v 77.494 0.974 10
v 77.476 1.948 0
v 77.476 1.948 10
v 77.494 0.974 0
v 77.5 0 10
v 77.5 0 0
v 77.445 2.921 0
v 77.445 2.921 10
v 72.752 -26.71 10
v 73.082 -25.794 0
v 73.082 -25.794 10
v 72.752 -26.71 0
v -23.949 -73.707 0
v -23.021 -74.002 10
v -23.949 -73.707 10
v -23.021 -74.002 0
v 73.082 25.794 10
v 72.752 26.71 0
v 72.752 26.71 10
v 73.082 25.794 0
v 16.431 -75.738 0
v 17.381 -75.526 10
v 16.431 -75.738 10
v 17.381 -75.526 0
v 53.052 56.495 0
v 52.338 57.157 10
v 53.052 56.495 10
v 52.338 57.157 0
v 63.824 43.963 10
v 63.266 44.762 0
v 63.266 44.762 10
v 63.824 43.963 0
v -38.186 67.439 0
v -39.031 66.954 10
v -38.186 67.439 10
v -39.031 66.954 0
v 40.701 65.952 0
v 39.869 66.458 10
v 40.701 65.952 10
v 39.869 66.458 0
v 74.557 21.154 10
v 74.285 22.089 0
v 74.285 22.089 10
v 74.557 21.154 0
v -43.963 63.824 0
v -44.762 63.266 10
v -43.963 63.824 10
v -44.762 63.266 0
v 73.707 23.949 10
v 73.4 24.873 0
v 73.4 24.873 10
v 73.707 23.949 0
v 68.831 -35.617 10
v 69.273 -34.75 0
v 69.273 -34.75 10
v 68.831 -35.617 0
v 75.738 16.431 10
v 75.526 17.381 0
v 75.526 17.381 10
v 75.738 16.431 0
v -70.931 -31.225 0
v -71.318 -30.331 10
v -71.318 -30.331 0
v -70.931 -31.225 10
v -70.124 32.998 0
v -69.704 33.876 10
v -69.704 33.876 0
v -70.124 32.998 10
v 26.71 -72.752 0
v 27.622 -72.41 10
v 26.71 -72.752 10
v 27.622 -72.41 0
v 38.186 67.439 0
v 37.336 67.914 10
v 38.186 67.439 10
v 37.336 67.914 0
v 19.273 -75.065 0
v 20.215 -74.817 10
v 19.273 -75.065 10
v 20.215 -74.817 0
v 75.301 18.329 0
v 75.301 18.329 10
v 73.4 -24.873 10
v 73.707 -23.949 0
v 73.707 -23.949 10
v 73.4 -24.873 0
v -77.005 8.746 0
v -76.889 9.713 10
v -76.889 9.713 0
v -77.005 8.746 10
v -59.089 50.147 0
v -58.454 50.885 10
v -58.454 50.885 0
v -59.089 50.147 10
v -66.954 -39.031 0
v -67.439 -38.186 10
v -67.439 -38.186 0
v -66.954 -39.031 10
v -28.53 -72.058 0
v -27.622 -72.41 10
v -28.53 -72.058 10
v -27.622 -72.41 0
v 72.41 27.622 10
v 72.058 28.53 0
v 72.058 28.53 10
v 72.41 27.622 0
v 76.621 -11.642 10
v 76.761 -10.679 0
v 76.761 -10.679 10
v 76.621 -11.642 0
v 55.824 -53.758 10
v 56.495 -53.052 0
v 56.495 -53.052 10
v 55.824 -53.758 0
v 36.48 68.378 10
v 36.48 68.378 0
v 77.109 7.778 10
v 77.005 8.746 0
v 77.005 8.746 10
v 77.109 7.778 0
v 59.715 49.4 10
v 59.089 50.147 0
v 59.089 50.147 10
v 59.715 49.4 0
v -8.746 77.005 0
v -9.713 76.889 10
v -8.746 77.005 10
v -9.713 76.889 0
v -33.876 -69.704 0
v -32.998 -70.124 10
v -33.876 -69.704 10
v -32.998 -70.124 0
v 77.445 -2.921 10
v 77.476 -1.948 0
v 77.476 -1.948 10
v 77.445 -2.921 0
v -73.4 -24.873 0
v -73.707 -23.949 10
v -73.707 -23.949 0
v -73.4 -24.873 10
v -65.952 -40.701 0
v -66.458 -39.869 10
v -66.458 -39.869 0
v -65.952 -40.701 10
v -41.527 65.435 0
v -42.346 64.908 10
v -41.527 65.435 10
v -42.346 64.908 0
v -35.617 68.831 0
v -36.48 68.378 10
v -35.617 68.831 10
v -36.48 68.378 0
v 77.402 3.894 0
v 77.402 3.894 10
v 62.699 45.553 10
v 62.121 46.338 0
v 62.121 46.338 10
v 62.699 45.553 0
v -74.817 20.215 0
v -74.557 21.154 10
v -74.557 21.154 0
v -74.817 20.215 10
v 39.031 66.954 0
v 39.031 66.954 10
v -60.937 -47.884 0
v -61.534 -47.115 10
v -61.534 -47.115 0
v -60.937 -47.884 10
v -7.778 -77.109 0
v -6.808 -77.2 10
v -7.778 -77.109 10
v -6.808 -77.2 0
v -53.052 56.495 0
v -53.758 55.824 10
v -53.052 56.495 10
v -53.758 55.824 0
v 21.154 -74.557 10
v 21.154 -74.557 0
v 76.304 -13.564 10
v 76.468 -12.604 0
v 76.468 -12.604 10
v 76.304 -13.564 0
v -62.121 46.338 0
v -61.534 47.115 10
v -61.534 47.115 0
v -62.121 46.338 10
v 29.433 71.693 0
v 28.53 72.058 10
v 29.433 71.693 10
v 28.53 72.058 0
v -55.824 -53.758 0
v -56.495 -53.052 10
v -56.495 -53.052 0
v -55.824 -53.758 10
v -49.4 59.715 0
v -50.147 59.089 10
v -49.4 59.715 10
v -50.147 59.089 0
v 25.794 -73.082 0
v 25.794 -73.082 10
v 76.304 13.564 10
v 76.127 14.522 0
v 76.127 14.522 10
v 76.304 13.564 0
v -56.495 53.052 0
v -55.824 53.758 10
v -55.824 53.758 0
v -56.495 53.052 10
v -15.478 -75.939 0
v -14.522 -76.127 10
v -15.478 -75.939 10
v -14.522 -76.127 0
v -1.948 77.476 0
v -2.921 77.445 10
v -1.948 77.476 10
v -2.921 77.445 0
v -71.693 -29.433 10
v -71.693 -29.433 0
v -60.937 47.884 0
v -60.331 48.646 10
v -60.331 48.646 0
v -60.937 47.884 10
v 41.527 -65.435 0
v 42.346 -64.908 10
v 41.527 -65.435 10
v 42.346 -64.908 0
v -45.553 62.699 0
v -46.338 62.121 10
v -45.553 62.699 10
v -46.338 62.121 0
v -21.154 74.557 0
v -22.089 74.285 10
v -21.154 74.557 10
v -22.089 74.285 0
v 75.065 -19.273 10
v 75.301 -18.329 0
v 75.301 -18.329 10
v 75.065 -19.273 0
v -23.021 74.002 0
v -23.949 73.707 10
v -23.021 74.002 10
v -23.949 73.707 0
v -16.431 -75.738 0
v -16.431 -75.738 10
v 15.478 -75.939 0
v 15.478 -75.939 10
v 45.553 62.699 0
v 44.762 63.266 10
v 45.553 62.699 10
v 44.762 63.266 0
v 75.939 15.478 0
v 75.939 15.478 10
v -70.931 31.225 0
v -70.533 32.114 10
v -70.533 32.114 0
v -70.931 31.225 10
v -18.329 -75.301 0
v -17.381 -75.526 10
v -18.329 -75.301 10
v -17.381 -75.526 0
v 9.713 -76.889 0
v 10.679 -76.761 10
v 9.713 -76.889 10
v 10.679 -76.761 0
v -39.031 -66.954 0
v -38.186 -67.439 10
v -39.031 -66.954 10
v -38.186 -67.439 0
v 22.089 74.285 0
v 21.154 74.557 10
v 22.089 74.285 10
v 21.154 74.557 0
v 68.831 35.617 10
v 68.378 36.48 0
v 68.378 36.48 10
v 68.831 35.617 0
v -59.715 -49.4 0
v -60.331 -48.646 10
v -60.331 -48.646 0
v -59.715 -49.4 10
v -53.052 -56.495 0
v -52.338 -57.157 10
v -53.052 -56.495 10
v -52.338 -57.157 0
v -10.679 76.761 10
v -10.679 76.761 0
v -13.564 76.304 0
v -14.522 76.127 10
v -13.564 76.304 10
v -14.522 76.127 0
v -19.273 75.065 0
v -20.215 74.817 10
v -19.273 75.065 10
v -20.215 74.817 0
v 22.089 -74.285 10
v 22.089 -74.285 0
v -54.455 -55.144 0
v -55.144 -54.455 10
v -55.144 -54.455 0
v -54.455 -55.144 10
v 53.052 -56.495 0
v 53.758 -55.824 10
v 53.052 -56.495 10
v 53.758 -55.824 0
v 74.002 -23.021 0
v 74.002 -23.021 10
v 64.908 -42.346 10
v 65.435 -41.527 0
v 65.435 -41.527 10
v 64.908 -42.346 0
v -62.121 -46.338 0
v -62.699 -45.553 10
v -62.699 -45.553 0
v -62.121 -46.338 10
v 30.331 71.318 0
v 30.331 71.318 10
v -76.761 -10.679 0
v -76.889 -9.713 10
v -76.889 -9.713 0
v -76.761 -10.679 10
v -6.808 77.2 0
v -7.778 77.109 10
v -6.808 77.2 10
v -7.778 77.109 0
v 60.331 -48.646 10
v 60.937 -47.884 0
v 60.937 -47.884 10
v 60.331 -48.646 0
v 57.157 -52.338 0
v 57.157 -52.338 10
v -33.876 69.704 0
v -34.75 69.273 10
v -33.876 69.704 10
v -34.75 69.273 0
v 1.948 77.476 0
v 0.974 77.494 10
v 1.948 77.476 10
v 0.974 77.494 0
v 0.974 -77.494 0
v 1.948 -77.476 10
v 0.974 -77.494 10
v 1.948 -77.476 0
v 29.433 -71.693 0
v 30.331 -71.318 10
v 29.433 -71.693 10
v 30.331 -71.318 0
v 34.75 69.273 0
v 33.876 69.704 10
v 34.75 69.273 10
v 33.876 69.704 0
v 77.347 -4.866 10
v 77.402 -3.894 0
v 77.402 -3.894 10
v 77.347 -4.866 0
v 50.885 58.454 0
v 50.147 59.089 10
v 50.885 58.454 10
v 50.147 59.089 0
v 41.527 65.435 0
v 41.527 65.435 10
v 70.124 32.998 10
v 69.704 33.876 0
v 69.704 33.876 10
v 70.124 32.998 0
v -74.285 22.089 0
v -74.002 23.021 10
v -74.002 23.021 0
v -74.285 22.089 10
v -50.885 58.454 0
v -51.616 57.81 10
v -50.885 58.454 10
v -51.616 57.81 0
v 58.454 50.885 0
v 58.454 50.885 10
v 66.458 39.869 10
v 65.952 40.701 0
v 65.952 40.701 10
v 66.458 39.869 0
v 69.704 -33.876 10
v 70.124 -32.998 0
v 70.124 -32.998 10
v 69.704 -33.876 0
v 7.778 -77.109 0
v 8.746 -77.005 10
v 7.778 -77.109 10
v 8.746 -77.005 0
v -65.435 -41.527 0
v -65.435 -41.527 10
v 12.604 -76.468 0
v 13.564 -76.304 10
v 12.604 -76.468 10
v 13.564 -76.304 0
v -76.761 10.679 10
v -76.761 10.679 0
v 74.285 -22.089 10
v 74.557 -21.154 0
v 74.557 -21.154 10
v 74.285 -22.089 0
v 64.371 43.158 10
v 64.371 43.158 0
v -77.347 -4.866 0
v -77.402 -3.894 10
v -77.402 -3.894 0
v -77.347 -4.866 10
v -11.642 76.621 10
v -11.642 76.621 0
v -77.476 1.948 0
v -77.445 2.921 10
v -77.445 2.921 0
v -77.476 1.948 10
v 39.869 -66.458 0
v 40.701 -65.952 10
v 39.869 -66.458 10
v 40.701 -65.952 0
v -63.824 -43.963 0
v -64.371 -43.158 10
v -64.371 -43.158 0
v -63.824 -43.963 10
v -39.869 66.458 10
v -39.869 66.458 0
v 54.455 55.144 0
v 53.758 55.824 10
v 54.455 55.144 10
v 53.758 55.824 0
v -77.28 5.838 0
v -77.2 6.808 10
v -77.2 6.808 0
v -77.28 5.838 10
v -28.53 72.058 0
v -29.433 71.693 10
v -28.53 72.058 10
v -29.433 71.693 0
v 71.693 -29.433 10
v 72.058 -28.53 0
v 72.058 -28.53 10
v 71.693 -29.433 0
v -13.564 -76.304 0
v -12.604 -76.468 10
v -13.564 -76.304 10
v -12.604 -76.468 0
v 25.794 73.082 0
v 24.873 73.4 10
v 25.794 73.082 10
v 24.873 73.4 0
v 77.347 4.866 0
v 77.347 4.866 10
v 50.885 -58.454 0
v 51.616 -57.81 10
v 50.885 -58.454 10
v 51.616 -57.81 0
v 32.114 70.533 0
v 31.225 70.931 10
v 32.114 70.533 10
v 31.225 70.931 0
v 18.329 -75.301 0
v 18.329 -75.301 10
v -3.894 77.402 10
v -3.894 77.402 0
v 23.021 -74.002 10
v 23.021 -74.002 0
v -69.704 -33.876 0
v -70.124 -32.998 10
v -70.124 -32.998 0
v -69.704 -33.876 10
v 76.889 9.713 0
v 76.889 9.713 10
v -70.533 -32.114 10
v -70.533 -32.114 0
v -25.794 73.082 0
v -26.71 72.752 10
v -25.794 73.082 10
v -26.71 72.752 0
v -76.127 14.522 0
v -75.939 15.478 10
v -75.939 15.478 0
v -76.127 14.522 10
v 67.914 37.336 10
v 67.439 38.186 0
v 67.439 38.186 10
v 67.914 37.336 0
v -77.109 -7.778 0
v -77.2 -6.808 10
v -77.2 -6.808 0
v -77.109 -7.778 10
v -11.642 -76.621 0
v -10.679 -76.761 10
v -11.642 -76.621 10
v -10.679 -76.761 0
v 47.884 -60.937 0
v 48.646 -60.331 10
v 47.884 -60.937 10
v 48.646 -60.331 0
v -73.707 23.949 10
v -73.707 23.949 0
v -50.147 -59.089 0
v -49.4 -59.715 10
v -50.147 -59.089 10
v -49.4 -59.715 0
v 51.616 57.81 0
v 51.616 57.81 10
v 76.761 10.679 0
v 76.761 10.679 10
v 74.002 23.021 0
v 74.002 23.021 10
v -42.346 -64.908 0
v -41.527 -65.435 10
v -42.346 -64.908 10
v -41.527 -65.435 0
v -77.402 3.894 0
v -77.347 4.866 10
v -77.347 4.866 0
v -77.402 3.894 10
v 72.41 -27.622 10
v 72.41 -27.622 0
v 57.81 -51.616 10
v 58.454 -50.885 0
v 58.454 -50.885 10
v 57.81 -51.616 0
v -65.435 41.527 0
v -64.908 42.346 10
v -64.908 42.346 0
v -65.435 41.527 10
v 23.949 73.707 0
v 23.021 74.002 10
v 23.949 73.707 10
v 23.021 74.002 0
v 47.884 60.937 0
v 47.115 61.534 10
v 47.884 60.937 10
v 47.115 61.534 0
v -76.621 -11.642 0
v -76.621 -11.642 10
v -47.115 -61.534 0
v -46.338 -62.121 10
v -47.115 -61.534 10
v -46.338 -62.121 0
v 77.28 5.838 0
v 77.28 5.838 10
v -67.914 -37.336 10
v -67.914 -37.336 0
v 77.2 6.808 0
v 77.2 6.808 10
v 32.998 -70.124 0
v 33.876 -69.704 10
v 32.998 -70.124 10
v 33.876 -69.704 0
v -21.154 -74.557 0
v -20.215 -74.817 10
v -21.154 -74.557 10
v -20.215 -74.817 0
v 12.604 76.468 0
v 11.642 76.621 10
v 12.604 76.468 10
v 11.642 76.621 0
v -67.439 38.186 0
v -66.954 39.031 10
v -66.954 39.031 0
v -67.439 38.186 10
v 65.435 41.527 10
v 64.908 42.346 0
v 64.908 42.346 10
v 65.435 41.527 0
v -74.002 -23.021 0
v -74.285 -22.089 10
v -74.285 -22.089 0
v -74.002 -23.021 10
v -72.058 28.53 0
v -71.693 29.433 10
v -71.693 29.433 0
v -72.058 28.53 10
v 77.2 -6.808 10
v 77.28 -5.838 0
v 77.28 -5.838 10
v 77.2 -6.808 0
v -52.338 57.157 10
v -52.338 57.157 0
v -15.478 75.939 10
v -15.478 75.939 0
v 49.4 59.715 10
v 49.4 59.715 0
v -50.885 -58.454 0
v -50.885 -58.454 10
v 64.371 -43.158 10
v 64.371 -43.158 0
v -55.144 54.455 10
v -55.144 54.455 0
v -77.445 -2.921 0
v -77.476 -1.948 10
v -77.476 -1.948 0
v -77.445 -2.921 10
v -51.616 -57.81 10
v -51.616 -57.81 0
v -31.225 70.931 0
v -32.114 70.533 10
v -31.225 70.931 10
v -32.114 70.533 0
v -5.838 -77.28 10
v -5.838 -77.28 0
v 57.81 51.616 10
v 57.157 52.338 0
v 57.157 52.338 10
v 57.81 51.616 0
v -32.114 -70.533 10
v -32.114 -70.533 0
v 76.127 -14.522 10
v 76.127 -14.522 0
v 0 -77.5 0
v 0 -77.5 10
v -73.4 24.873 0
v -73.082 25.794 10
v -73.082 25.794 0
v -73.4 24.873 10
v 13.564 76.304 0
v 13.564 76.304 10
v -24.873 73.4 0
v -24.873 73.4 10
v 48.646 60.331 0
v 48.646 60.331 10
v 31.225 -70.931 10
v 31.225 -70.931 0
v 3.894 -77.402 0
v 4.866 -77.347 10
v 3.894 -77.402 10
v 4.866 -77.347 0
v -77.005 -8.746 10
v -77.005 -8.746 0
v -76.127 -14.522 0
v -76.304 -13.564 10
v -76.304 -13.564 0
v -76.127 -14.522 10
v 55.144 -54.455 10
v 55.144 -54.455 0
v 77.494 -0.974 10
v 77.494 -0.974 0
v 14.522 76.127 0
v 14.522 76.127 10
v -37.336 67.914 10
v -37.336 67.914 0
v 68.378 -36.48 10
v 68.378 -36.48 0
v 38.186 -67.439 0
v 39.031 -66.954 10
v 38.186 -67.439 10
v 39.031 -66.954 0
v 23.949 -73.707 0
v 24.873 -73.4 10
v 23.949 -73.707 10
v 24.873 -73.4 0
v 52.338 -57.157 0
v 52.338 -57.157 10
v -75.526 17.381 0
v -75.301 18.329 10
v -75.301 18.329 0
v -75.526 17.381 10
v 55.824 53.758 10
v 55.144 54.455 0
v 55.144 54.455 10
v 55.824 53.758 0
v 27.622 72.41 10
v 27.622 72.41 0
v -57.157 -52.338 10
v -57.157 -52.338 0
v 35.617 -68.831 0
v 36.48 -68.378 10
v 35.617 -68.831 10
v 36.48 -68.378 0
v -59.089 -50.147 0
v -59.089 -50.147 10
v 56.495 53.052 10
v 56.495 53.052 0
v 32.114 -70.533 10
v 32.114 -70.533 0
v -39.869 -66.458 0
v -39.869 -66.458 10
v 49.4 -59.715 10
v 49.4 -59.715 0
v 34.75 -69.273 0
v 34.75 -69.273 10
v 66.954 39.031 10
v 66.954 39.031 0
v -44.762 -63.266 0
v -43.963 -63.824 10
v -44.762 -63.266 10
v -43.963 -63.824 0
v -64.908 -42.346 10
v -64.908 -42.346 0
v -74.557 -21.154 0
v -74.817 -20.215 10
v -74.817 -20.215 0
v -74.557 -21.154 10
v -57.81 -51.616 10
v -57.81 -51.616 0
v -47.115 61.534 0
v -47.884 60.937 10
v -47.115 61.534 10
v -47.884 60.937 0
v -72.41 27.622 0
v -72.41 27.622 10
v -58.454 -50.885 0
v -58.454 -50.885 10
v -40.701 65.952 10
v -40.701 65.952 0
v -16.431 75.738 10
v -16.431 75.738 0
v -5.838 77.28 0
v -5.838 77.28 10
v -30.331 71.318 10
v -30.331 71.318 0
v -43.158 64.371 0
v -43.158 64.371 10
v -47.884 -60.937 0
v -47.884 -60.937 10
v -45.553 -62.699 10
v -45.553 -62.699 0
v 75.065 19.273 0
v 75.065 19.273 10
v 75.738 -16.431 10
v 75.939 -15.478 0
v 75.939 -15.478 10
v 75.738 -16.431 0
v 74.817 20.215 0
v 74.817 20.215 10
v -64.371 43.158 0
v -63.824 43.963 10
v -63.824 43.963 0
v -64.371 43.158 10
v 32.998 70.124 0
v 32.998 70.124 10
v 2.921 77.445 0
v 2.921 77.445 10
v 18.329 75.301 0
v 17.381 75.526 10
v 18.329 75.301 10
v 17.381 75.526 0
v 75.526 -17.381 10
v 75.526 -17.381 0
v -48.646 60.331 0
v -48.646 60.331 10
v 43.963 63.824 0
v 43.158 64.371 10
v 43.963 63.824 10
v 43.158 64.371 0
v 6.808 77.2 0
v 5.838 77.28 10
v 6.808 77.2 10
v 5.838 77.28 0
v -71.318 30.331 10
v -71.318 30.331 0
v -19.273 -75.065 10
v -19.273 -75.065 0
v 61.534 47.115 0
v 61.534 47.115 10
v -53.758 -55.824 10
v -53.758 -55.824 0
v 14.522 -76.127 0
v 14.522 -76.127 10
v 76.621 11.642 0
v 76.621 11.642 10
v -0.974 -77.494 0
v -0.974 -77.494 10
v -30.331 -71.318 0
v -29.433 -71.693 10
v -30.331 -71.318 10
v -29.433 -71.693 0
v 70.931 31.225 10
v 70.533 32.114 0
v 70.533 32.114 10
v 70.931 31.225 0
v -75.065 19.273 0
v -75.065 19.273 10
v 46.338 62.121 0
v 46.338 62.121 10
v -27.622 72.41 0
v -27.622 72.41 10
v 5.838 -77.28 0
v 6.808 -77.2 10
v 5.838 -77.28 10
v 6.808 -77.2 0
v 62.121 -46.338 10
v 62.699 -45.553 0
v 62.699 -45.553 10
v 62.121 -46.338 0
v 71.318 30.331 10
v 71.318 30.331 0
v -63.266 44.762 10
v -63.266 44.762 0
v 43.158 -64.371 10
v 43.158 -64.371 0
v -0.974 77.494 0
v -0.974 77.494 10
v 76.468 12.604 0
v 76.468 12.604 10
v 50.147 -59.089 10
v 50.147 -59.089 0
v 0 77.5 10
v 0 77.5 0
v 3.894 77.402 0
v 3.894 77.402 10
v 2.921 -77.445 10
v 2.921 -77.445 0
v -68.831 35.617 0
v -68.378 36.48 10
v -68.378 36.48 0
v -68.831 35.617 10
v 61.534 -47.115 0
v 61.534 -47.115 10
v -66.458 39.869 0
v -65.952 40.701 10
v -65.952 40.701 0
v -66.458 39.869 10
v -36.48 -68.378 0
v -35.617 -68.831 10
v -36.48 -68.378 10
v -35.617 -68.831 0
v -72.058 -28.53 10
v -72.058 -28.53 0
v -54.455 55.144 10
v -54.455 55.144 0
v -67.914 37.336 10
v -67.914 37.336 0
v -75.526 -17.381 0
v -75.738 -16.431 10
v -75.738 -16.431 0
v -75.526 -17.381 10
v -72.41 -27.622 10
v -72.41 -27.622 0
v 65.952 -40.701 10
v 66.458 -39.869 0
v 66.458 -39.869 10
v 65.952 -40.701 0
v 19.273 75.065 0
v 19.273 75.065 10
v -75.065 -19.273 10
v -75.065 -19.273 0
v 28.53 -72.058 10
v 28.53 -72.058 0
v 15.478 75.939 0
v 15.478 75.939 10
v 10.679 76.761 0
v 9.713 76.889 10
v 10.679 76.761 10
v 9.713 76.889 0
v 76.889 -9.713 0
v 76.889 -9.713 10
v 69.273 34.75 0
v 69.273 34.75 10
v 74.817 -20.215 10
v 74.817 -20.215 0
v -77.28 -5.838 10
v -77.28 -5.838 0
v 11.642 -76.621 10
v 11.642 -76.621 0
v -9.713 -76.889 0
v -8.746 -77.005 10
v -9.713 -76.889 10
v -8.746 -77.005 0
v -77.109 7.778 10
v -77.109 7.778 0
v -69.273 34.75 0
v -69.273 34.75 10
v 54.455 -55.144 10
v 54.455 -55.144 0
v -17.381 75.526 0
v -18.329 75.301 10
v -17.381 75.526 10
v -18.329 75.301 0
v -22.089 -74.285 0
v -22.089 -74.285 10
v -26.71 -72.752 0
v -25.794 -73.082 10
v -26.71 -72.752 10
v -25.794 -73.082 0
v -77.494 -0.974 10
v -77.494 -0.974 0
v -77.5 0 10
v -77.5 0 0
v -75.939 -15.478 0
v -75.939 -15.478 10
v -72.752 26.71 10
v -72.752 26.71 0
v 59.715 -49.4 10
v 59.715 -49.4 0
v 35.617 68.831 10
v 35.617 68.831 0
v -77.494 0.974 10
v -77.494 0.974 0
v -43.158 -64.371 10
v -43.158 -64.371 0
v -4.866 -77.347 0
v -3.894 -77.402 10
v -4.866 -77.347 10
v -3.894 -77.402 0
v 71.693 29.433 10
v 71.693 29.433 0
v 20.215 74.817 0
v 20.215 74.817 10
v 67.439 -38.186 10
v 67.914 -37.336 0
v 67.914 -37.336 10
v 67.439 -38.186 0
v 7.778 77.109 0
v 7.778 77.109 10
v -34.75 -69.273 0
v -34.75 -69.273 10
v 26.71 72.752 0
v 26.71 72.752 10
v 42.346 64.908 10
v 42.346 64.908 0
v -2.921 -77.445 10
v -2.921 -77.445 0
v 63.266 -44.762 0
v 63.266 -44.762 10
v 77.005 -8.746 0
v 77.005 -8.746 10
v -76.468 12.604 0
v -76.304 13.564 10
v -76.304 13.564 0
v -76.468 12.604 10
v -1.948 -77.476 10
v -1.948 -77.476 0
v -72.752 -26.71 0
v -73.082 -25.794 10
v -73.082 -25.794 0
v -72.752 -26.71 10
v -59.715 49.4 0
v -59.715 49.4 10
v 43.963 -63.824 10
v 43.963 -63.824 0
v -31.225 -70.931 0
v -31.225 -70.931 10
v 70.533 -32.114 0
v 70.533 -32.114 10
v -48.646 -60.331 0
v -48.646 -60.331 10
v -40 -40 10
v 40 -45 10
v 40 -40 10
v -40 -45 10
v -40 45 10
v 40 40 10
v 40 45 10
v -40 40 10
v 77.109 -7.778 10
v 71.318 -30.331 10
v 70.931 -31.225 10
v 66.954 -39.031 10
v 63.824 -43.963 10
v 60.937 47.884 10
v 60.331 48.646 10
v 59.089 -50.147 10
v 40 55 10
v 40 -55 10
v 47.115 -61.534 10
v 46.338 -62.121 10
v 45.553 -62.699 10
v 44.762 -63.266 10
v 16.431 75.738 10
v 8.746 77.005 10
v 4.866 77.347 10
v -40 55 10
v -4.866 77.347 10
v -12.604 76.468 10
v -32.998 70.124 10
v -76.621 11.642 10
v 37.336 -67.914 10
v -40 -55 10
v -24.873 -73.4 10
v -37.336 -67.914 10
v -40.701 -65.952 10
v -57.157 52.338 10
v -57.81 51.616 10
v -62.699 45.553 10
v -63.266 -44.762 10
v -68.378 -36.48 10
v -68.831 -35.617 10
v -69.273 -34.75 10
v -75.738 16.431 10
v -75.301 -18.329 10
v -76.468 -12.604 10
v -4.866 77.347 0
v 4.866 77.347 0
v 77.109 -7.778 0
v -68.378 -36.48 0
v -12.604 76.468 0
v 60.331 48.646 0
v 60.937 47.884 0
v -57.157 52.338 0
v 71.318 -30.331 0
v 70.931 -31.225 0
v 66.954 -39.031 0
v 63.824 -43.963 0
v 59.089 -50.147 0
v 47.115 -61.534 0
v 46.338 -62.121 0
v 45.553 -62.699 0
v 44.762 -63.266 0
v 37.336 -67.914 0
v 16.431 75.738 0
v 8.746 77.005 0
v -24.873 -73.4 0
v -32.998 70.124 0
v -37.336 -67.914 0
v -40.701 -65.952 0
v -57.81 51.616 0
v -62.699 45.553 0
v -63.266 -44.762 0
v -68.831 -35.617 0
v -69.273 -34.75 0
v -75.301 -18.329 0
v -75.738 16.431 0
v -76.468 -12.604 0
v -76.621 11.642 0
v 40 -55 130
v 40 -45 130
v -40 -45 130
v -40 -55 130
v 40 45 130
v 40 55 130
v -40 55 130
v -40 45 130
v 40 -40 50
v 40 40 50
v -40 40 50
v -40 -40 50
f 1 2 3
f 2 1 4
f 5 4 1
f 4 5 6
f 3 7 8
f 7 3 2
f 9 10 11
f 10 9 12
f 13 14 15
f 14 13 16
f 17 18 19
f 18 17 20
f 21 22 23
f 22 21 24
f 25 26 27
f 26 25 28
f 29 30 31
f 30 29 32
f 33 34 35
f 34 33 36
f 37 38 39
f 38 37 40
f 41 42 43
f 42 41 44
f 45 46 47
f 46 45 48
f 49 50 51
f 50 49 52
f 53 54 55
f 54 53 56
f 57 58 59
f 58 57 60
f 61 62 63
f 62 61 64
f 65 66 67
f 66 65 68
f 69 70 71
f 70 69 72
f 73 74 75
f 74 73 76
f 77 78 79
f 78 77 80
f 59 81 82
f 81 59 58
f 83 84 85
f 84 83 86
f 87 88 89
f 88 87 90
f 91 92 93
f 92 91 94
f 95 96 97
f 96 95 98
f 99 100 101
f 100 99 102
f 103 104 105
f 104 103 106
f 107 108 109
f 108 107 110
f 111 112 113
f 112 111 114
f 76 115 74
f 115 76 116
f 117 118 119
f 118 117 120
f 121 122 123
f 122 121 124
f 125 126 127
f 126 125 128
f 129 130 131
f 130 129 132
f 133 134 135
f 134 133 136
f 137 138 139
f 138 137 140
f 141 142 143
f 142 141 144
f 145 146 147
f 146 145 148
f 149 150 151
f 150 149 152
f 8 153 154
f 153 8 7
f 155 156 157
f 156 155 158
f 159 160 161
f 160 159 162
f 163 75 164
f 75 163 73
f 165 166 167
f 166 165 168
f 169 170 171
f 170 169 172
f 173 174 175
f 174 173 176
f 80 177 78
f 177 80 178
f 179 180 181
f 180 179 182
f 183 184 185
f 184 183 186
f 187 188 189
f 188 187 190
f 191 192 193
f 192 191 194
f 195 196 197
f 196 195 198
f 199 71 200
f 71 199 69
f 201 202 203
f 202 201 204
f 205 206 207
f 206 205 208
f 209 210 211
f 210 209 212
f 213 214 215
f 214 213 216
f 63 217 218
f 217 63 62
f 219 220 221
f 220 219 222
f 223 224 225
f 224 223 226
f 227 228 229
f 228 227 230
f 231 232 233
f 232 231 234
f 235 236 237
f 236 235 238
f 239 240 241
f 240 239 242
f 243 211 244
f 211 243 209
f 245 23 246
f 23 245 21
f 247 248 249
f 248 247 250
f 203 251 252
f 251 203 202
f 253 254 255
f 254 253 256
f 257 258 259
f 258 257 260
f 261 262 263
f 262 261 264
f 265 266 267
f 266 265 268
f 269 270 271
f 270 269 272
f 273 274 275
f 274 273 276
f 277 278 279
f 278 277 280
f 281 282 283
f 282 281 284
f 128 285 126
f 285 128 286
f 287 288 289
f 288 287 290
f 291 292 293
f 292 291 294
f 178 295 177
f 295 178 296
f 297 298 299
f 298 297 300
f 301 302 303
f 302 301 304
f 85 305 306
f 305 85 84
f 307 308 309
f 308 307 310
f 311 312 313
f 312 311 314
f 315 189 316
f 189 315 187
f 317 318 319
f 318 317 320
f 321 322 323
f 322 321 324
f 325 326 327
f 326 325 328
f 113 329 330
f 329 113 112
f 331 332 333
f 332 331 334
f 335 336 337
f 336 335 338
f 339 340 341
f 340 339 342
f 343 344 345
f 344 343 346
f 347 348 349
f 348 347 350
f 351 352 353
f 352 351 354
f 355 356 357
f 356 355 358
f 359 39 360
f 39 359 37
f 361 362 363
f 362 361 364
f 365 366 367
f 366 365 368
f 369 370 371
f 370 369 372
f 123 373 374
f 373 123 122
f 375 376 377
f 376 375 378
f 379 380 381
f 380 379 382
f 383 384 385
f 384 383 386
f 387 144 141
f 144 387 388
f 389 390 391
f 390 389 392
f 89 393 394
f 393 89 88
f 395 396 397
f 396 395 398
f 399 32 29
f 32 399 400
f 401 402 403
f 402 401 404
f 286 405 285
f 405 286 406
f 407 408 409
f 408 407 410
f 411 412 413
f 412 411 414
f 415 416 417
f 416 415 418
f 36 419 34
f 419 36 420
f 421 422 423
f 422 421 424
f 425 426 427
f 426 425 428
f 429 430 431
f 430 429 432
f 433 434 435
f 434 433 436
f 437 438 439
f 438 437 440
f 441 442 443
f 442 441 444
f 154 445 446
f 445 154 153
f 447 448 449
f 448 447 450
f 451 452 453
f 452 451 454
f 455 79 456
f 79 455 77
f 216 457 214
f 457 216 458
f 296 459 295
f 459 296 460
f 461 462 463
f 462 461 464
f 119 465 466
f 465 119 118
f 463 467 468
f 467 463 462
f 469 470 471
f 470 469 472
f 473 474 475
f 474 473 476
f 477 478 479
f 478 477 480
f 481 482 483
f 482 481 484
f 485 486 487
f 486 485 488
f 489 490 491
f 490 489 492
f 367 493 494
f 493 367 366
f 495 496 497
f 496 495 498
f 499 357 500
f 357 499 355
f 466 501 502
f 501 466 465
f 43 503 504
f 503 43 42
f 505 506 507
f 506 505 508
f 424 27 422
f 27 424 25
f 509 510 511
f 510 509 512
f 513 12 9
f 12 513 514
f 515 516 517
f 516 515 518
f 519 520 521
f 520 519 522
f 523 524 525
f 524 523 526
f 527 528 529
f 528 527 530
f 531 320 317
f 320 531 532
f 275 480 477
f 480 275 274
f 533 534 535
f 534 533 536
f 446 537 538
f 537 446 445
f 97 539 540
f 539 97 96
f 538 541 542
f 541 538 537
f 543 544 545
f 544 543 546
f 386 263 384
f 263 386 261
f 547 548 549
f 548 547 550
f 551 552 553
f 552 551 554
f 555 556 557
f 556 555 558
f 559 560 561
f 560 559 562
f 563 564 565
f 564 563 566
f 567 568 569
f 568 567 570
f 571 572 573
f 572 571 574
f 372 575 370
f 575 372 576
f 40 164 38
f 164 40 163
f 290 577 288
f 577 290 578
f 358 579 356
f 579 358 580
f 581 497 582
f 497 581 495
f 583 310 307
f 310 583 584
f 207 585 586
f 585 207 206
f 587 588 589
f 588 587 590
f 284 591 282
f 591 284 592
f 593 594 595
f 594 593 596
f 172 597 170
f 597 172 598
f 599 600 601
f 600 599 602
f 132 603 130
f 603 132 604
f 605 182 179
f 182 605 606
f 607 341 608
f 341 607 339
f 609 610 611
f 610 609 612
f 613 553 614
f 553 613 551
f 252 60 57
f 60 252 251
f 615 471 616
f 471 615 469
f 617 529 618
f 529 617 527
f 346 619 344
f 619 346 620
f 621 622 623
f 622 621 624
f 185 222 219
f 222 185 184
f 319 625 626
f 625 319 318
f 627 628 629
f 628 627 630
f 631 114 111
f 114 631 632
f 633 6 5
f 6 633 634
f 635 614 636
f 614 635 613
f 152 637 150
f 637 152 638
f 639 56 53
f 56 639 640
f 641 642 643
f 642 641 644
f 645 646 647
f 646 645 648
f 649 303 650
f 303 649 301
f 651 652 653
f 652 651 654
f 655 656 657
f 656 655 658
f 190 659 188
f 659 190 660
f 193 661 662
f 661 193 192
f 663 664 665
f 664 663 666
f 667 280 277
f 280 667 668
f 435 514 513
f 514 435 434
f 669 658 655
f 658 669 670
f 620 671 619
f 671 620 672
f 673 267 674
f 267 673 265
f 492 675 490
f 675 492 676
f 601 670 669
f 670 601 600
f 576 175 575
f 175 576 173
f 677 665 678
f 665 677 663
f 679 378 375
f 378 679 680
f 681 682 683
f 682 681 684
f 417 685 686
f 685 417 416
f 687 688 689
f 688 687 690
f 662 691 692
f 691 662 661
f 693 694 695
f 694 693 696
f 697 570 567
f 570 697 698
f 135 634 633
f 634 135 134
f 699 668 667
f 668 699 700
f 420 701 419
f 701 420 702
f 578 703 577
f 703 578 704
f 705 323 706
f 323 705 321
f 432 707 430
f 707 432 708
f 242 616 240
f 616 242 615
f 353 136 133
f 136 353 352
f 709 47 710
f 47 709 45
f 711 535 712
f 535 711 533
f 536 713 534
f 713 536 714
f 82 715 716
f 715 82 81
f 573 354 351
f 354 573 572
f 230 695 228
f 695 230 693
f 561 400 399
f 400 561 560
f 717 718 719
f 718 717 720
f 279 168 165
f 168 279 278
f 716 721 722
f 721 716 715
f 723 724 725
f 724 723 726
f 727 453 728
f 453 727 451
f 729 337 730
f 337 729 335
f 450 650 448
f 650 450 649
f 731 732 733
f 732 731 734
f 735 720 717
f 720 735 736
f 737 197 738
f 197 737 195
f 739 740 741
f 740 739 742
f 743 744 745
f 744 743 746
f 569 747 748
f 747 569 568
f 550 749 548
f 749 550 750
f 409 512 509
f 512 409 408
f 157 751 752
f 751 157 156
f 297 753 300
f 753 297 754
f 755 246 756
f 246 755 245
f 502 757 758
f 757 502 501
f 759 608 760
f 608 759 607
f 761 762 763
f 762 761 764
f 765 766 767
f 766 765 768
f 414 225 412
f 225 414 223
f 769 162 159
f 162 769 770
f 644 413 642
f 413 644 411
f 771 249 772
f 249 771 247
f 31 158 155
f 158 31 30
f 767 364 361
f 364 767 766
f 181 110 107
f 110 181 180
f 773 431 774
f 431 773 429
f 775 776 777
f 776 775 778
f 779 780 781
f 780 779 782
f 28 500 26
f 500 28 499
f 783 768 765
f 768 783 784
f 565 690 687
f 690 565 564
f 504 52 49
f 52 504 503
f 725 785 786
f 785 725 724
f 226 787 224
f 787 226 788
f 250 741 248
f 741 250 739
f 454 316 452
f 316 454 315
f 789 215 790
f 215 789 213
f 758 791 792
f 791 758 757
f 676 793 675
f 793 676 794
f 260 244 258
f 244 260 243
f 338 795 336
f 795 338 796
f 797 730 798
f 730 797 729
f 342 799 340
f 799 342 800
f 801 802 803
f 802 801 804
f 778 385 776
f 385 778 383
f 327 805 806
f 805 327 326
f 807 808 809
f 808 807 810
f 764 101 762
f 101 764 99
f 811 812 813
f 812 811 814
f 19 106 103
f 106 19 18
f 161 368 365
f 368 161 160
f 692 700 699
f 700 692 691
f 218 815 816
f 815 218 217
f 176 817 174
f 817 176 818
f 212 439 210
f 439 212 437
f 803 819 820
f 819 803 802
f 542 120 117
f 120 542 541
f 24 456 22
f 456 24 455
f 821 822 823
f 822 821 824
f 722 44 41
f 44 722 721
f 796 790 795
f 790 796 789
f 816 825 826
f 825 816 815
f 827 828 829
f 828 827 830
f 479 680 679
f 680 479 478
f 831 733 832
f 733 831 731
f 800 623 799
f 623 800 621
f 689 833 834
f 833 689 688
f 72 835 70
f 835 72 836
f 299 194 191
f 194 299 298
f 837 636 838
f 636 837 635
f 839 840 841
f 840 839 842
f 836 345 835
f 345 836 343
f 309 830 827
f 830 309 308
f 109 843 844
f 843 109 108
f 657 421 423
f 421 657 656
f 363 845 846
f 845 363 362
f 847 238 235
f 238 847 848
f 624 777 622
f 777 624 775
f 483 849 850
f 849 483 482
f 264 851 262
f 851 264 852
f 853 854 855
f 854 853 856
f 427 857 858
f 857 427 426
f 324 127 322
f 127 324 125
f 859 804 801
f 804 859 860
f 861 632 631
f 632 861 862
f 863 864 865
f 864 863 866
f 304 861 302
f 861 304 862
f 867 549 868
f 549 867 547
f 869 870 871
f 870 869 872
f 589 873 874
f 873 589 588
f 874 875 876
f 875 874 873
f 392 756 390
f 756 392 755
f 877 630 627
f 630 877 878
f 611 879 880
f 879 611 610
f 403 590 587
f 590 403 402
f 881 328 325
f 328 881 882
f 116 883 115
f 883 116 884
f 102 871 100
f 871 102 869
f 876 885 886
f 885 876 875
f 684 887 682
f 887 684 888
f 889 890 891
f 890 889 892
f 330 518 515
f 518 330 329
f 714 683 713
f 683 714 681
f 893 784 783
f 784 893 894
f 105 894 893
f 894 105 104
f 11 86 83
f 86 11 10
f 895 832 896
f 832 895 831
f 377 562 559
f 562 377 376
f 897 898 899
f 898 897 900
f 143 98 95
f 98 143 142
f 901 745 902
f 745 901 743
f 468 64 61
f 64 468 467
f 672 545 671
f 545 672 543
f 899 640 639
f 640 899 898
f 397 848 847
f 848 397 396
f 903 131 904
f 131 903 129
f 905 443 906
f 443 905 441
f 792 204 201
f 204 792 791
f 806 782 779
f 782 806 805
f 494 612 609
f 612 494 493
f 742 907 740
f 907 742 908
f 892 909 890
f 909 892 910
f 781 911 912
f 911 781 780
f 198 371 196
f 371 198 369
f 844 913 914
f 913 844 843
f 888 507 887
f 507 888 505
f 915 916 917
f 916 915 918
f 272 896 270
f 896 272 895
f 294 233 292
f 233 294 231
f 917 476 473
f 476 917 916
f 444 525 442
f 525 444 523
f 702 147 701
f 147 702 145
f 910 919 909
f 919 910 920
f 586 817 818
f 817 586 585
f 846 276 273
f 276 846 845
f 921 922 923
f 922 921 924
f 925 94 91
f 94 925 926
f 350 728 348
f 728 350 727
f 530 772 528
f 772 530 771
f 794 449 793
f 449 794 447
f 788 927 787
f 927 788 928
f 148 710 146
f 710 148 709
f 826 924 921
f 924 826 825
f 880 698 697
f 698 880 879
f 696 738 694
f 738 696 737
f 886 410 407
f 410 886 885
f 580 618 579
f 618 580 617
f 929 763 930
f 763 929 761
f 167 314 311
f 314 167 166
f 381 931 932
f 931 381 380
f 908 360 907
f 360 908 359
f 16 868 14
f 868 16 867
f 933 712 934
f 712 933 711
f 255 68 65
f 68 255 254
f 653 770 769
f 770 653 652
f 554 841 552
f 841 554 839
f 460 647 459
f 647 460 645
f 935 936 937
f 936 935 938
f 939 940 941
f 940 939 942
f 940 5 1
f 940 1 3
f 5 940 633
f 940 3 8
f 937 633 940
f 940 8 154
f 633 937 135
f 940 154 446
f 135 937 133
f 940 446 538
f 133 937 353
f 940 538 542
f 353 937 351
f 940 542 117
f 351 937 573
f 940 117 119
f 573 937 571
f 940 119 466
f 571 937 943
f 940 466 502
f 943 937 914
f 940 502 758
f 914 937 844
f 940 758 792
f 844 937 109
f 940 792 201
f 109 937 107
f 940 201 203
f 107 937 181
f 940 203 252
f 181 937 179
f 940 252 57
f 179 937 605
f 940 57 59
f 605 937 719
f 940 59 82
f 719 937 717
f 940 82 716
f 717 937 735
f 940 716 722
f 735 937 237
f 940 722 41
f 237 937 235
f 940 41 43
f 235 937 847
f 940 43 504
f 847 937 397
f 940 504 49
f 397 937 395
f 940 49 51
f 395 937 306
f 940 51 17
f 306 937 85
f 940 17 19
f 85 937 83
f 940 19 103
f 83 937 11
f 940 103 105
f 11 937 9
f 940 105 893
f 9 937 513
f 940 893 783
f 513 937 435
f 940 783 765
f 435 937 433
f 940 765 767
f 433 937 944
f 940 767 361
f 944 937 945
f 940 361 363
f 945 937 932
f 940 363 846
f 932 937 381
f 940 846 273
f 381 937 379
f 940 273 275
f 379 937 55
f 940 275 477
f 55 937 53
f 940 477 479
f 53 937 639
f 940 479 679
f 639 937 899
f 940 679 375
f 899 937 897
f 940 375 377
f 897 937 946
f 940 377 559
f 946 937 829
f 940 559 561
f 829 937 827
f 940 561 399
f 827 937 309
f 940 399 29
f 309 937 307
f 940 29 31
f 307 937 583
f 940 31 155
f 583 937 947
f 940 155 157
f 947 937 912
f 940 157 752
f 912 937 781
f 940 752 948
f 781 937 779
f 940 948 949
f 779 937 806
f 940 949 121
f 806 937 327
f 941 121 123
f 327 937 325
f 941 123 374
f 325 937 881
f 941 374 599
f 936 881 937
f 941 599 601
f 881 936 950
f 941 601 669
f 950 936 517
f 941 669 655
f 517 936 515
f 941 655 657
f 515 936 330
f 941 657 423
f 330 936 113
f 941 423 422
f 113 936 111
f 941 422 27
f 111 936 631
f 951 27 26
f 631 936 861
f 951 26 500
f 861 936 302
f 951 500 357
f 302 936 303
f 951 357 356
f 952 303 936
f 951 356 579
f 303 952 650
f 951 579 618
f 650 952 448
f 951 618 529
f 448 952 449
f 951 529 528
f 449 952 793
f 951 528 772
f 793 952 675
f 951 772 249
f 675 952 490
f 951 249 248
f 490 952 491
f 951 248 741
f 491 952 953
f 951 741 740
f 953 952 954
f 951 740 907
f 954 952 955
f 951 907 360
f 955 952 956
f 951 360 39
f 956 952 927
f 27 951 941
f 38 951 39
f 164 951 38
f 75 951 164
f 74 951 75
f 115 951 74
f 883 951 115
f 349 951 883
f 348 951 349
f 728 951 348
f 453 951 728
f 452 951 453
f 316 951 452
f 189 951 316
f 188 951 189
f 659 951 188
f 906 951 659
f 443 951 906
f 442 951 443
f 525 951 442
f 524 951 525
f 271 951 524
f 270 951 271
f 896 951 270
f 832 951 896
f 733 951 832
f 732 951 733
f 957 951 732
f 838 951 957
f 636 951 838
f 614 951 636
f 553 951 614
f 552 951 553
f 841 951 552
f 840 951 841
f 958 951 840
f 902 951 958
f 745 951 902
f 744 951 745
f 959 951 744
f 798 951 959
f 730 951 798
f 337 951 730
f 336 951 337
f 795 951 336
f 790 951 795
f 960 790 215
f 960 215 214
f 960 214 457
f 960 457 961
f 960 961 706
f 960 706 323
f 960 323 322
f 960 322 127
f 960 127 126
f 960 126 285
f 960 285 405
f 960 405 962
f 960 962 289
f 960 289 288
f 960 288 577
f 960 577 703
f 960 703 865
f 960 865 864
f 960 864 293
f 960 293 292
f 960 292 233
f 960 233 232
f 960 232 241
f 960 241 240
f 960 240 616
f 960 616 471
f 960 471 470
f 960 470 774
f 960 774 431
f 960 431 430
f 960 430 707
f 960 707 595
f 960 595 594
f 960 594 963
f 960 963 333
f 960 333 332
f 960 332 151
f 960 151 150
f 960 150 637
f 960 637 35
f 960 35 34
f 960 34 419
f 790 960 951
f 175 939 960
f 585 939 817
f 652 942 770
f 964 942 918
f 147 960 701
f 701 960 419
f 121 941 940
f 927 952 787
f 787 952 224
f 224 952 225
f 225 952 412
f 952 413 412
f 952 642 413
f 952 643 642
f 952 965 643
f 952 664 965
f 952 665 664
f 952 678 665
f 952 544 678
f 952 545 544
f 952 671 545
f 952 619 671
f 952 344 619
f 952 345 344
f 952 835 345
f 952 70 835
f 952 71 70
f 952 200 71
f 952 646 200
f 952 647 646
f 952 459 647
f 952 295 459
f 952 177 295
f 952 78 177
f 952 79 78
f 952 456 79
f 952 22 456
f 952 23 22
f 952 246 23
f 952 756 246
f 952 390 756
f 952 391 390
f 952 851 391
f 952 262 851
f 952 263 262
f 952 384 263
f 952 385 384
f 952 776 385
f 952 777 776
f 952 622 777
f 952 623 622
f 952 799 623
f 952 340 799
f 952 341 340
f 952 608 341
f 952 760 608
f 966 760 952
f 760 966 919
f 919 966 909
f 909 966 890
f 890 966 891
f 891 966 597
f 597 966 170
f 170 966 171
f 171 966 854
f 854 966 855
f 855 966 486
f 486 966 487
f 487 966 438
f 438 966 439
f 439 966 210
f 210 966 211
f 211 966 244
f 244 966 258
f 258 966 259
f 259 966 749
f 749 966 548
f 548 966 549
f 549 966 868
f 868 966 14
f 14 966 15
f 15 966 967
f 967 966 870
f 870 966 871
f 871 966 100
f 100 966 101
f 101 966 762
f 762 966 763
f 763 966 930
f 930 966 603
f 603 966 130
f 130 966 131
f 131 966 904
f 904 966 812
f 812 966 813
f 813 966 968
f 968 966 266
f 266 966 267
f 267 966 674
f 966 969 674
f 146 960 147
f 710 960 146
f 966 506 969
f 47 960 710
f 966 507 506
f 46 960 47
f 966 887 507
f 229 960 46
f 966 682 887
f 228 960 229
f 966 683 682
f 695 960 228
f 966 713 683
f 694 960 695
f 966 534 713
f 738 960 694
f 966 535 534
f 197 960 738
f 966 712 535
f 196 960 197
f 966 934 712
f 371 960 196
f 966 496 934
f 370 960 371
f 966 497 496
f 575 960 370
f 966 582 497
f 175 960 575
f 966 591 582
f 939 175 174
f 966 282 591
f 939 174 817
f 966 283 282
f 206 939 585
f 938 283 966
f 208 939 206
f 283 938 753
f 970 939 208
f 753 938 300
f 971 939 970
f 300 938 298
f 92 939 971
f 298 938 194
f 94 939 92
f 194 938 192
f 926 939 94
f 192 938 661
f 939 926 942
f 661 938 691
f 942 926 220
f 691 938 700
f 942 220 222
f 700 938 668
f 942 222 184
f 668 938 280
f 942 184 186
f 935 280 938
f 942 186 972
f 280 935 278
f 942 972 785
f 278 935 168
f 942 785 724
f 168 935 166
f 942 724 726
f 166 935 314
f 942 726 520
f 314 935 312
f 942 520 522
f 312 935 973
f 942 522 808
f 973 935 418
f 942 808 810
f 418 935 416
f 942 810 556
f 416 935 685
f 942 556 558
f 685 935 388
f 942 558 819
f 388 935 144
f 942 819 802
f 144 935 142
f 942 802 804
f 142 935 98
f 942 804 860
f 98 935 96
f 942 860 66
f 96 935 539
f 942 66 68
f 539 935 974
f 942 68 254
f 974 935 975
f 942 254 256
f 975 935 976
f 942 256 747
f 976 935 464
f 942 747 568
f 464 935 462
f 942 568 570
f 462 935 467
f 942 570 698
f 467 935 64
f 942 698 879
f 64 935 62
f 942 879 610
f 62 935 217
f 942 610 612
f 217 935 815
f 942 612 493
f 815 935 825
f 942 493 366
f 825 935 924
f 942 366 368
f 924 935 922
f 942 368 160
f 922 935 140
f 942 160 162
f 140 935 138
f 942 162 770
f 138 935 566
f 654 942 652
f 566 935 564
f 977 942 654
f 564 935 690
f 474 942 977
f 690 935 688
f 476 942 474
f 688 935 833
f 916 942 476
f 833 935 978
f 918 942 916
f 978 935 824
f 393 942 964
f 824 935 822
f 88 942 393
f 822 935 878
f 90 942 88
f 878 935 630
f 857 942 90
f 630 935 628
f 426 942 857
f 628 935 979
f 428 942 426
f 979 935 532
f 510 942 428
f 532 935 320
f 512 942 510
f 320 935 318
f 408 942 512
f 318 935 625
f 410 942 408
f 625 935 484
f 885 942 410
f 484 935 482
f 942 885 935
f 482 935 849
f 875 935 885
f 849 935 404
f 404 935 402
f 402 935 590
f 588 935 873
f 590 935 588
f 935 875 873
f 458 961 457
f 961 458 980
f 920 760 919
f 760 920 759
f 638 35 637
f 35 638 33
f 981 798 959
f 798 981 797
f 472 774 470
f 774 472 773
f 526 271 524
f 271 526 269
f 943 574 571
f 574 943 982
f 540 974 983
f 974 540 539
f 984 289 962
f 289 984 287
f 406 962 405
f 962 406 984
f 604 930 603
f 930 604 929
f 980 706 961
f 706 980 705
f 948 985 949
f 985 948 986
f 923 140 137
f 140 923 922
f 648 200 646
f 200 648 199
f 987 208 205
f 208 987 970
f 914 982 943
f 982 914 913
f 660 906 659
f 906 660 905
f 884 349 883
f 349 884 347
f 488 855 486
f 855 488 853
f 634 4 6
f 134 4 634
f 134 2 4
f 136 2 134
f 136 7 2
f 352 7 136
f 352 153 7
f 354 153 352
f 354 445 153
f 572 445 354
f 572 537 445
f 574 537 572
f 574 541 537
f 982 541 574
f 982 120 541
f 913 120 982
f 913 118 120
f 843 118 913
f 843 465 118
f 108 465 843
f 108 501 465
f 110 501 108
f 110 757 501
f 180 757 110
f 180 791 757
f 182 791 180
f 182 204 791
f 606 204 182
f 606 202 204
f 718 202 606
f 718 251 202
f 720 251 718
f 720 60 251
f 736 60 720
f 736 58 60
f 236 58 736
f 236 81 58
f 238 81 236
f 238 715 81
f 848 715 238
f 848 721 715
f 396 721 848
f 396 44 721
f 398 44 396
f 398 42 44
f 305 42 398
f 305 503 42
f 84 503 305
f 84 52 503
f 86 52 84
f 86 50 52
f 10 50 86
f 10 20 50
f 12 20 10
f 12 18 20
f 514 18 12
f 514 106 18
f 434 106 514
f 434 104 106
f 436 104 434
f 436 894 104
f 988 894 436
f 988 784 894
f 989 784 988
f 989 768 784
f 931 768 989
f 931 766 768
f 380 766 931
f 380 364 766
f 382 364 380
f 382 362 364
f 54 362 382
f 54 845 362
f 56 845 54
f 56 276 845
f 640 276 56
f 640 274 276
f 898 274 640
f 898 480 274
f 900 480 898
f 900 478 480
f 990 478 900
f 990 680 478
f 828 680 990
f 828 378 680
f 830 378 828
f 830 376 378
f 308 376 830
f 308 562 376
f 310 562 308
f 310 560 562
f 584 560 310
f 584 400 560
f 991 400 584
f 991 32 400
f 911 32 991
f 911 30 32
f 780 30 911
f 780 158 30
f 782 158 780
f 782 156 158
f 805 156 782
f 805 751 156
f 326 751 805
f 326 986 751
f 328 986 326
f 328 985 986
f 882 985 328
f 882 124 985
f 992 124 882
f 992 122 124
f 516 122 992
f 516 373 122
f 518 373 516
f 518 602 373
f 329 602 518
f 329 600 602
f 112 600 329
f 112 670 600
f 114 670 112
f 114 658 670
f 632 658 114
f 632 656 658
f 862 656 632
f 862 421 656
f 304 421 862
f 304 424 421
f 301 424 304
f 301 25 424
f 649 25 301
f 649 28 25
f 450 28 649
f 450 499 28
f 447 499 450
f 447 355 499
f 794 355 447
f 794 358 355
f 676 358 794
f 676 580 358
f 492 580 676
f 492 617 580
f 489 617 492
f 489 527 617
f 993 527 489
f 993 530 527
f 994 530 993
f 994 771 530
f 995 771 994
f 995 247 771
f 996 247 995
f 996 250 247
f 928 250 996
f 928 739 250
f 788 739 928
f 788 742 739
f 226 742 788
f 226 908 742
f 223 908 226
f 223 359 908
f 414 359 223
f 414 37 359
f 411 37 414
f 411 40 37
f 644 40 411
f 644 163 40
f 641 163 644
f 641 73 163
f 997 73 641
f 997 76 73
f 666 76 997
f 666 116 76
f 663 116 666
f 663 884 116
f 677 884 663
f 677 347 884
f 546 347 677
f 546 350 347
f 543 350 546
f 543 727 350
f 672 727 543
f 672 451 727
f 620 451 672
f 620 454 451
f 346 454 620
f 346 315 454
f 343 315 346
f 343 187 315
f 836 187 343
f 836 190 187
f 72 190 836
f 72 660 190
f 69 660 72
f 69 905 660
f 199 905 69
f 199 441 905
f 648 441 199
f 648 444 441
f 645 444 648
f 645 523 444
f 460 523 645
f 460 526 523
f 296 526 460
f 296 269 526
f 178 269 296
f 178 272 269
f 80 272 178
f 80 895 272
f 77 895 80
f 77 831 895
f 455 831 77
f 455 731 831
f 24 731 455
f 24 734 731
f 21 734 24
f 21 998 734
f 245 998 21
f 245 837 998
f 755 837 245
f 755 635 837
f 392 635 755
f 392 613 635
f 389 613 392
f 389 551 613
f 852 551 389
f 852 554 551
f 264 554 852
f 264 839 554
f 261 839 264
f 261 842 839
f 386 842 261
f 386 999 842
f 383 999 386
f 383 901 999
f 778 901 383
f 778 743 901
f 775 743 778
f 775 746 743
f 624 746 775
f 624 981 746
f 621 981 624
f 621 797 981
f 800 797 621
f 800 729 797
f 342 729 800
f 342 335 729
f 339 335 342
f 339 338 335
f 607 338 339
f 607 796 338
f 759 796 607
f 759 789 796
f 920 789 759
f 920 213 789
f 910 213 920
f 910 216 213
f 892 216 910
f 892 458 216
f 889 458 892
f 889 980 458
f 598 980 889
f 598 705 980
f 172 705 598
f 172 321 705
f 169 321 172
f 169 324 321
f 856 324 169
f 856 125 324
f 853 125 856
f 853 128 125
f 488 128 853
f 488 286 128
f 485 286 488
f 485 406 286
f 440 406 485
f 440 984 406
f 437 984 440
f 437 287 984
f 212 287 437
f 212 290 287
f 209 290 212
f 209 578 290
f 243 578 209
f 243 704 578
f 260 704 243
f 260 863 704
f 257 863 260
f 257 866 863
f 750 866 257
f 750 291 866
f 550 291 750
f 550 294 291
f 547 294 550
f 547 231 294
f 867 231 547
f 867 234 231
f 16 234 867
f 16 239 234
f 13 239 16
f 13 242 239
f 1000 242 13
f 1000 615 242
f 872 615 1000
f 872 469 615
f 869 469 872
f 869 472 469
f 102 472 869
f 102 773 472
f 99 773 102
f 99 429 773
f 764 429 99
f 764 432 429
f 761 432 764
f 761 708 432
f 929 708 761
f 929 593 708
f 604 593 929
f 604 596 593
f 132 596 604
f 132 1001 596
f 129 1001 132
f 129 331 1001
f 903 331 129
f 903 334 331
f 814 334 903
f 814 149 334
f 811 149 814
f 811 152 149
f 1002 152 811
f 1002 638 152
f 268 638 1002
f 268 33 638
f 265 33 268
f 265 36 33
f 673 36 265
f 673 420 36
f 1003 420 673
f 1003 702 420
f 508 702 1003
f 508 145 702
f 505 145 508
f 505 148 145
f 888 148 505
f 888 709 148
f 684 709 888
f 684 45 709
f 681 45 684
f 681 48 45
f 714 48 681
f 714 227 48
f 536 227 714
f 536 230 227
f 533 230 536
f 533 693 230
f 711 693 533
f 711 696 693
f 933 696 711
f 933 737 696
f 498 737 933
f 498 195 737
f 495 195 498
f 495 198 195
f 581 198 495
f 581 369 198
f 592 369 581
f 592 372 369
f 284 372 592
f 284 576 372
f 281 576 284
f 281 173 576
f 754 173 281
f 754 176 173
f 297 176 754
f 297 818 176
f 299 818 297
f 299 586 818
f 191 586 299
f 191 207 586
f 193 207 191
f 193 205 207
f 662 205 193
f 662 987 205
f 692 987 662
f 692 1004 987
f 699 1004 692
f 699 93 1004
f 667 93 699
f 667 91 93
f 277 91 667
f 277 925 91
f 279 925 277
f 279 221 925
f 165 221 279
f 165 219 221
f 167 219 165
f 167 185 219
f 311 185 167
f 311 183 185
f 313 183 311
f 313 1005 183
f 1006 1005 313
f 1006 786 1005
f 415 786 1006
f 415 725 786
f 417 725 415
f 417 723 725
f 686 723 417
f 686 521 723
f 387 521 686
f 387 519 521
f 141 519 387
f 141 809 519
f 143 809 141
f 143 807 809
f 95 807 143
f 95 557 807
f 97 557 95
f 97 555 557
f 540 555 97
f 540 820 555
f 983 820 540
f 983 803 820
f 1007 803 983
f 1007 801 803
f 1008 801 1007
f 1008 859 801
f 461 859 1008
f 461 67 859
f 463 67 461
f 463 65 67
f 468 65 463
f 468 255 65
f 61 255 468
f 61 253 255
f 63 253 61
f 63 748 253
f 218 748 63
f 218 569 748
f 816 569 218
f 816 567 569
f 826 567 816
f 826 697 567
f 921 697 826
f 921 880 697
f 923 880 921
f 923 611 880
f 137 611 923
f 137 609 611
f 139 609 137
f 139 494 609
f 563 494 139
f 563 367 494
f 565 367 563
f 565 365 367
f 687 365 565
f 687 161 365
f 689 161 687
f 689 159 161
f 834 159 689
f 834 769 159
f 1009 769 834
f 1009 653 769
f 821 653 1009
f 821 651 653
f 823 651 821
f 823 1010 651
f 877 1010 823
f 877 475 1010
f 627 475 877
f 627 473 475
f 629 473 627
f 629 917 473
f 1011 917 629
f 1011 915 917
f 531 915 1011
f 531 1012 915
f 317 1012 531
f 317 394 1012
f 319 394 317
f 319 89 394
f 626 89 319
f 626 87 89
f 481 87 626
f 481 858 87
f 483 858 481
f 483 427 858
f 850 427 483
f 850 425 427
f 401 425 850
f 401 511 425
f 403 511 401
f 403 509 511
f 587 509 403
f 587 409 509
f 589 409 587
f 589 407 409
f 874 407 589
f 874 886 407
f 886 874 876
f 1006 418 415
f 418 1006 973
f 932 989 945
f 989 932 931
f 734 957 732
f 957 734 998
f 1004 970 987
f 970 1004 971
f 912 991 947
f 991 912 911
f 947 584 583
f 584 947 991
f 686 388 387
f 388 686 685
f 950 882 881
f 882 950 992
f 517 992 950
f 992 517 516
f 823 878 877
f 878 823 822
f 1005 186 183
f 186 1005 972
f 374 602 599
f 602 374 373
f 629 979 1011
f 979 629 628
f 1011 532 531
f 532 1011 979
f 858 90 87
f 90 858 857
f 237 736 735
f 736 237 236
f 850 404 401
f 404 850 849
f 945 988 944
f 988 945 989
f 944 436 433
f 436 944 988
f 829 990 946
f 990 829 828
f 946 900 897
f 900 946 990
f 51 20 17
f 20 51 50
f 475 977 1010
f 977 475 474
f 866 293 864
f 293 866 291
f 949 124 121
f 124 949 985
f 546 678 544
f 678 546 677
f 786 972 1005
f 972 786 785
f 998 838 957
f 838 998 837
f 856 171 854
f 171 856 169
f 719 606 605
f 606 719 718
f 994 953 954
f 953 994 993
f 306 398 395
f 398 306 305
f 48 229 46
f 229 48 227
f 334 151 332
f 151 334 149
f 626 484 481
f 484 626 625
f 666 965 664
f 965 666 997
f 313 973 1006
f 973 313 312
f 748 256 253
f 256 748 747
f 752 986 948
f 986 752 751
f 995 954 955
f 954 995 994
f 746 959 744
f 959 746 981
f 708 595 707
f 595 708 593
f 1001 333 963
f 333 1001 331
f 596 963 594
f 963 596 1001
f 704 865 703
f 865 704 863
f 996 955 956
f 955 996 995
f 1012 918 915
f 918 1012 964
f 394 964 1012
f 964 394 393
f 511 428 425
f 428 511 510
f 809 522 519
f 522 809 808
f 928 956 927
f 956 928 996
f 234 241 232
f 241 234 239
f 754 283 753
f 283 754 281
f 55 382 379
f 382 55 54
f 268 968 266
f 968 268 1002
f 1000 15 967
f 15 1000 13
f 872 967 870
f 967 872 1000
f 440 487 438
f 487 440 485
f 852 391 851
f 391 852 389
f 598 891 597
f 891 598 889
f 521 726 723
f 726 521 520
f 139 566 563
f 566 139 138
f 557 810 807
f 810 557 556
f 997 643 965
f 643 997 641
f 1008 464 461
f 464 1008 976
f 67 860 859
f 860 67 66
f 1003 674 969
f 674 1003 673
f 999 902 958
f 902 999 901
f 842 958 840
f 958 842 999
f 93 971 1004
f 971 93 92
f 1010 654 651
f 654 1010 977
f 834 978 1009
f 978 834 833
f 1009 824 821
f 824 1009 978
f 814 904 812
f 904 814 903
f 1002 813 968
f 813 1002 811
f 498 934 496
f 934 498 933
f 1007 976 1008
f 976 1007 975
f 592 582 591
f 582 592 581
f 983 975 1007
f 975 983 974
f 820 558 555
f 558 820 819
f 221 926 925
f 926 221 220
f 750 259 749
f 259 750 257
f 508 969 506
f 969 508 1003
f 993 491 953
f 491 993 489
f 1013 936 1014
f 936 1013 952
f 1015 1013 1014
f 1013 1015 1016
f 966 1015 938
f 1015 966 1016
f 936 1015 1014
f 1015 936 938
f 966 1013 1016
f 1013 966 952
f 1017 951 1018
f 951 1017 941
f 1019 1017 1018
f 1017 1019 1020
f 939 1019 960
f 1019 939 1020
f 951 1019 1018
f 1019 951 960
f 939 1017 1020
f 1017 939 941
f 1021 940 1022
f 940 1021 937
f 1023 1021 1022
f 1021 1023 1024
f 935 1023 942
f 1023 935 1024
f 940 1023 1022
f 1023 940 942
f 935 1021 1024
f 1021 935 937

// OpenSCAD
// file: consts.scad
/*
DESCRIPTION
  Constants for SCUSU CAD model.

AUTHORS
  Saxon A. Nelson-Milton <saxon@ausocean.org>

LICENSE
  Copyright (C) 2020 the Australian Ocean Lab (AusOcean)

  It is free software: you can redistribute it and/or modify them
  under the terms of the GNU General Public License as published by the
  Free Software Foundation, either version 3 of the License, or (at your
  option) any later version.

  It is distributed in the hope that it will be useful, but WITHOUT
  ANY WARRANTY; without even the implied warranty of MERCHANTABILITY or
  FITNESS FOR A PARTICULAR PURPOSE. See the GNU General Public License
  for more details.

  You should have received a copy of the GNU General Public License
  in gpl.txt.  If not, see http://www.gnu.org/licenses.
*/

alpha = 0.5;

// Misc.
noOfFaces = 500;

$fn = noOfFaces;

// Pipe properties.
pipeLength              = 600;
pipeOuterDiameter       = 160;
pipeInternalDiameter    = 155;

// Access coupling properties.
couplingInnerDiameter = 160;
couplingOuterDiameter = couplingInnerDiameter+10;
couplingLength        = 160;

// Threaded cap properties.
capInnerDiameter    = couplingOuterDiameter;
capOuterDiameter    = 185;
capLength           = 35;

// Battery properties.
battLength = 151;
battWidth = 98;
battHeight = 93;

// Wood properties.
woodColor = [1,178/255,102/255];
woodThickness = 10;

// Battery holder end properties.
holderEndWidth = woodThickness;
holderEndDiameter = pipeInternalDiameter;

// Calculate battery displacement from center.
battDisplacement = sqrt(pow(pipeInternalDiameter/2,2)-pow(battWidth/2,2))-(battHeight/2);

// Reed switch properties.
reedSwitchLen = 40;
reedSwitchWidth = 10;
reedSwitchHeight = 10;
reedSwitchDisplacement = 30;

// Spacer properties.
spacerLegHeight = 120;
spacerLegLength = 80;
// main file
/*
DESCRIPTION
  Model of the wooden "spacer" that separates the battery assembly from
  the front cap. NB: the electronics jiffy box is also included here.

AUTHORS
  Saxon A. Nelson-Milton <saxon@ausocean.org>

LICENSE
  Copyright (C) 2020 the Australian Ocean Lab (AusOcean)

  It is free software: you can redistribute it and/or modify them
  under the terms of the GNU General Public License as published by the
  Free Software Foundation, either version 3 of the License, or (at your
  option) any later version.

  It is distributed in the hope that it will be useful, but WITHOUT
  ANY WARRANTY; without even the implied warranty of MERCHANTABILITY or
  FITNESS FOR A PARTICULAR PURPOSE. See the GNU General Public License
  for more details.

  You should have received a copy of the GNU General Public License
  in gpl.txt.  If not, see http://www.gnu.org/licenses.
*/

include <consts.scad>

spacer();

module spacer(){
    color(woodColor)
    translate([0,0,woodThickness/2])
    cylinder(h=woodThickness,d=pipeInternalDiameter,center=true);

    color(woodColor)
    translate([0,-50,(spacerLegHeight/2)+woodThickness])
    cube([spacerLegLength,woodThickness,spacerLegHeight],center=true);

    color(woodColor)
    translate([0,50,(spacerLegHeight/2)+woodThickness])
    cube([spacerLegLength,woodThickness,spacerLegHeight],center=true);

    // Electronics jiffy box.
    color("grey")
    translate([0,0,20+woodThickness])
    cube([80,80,40],center=true);
}
